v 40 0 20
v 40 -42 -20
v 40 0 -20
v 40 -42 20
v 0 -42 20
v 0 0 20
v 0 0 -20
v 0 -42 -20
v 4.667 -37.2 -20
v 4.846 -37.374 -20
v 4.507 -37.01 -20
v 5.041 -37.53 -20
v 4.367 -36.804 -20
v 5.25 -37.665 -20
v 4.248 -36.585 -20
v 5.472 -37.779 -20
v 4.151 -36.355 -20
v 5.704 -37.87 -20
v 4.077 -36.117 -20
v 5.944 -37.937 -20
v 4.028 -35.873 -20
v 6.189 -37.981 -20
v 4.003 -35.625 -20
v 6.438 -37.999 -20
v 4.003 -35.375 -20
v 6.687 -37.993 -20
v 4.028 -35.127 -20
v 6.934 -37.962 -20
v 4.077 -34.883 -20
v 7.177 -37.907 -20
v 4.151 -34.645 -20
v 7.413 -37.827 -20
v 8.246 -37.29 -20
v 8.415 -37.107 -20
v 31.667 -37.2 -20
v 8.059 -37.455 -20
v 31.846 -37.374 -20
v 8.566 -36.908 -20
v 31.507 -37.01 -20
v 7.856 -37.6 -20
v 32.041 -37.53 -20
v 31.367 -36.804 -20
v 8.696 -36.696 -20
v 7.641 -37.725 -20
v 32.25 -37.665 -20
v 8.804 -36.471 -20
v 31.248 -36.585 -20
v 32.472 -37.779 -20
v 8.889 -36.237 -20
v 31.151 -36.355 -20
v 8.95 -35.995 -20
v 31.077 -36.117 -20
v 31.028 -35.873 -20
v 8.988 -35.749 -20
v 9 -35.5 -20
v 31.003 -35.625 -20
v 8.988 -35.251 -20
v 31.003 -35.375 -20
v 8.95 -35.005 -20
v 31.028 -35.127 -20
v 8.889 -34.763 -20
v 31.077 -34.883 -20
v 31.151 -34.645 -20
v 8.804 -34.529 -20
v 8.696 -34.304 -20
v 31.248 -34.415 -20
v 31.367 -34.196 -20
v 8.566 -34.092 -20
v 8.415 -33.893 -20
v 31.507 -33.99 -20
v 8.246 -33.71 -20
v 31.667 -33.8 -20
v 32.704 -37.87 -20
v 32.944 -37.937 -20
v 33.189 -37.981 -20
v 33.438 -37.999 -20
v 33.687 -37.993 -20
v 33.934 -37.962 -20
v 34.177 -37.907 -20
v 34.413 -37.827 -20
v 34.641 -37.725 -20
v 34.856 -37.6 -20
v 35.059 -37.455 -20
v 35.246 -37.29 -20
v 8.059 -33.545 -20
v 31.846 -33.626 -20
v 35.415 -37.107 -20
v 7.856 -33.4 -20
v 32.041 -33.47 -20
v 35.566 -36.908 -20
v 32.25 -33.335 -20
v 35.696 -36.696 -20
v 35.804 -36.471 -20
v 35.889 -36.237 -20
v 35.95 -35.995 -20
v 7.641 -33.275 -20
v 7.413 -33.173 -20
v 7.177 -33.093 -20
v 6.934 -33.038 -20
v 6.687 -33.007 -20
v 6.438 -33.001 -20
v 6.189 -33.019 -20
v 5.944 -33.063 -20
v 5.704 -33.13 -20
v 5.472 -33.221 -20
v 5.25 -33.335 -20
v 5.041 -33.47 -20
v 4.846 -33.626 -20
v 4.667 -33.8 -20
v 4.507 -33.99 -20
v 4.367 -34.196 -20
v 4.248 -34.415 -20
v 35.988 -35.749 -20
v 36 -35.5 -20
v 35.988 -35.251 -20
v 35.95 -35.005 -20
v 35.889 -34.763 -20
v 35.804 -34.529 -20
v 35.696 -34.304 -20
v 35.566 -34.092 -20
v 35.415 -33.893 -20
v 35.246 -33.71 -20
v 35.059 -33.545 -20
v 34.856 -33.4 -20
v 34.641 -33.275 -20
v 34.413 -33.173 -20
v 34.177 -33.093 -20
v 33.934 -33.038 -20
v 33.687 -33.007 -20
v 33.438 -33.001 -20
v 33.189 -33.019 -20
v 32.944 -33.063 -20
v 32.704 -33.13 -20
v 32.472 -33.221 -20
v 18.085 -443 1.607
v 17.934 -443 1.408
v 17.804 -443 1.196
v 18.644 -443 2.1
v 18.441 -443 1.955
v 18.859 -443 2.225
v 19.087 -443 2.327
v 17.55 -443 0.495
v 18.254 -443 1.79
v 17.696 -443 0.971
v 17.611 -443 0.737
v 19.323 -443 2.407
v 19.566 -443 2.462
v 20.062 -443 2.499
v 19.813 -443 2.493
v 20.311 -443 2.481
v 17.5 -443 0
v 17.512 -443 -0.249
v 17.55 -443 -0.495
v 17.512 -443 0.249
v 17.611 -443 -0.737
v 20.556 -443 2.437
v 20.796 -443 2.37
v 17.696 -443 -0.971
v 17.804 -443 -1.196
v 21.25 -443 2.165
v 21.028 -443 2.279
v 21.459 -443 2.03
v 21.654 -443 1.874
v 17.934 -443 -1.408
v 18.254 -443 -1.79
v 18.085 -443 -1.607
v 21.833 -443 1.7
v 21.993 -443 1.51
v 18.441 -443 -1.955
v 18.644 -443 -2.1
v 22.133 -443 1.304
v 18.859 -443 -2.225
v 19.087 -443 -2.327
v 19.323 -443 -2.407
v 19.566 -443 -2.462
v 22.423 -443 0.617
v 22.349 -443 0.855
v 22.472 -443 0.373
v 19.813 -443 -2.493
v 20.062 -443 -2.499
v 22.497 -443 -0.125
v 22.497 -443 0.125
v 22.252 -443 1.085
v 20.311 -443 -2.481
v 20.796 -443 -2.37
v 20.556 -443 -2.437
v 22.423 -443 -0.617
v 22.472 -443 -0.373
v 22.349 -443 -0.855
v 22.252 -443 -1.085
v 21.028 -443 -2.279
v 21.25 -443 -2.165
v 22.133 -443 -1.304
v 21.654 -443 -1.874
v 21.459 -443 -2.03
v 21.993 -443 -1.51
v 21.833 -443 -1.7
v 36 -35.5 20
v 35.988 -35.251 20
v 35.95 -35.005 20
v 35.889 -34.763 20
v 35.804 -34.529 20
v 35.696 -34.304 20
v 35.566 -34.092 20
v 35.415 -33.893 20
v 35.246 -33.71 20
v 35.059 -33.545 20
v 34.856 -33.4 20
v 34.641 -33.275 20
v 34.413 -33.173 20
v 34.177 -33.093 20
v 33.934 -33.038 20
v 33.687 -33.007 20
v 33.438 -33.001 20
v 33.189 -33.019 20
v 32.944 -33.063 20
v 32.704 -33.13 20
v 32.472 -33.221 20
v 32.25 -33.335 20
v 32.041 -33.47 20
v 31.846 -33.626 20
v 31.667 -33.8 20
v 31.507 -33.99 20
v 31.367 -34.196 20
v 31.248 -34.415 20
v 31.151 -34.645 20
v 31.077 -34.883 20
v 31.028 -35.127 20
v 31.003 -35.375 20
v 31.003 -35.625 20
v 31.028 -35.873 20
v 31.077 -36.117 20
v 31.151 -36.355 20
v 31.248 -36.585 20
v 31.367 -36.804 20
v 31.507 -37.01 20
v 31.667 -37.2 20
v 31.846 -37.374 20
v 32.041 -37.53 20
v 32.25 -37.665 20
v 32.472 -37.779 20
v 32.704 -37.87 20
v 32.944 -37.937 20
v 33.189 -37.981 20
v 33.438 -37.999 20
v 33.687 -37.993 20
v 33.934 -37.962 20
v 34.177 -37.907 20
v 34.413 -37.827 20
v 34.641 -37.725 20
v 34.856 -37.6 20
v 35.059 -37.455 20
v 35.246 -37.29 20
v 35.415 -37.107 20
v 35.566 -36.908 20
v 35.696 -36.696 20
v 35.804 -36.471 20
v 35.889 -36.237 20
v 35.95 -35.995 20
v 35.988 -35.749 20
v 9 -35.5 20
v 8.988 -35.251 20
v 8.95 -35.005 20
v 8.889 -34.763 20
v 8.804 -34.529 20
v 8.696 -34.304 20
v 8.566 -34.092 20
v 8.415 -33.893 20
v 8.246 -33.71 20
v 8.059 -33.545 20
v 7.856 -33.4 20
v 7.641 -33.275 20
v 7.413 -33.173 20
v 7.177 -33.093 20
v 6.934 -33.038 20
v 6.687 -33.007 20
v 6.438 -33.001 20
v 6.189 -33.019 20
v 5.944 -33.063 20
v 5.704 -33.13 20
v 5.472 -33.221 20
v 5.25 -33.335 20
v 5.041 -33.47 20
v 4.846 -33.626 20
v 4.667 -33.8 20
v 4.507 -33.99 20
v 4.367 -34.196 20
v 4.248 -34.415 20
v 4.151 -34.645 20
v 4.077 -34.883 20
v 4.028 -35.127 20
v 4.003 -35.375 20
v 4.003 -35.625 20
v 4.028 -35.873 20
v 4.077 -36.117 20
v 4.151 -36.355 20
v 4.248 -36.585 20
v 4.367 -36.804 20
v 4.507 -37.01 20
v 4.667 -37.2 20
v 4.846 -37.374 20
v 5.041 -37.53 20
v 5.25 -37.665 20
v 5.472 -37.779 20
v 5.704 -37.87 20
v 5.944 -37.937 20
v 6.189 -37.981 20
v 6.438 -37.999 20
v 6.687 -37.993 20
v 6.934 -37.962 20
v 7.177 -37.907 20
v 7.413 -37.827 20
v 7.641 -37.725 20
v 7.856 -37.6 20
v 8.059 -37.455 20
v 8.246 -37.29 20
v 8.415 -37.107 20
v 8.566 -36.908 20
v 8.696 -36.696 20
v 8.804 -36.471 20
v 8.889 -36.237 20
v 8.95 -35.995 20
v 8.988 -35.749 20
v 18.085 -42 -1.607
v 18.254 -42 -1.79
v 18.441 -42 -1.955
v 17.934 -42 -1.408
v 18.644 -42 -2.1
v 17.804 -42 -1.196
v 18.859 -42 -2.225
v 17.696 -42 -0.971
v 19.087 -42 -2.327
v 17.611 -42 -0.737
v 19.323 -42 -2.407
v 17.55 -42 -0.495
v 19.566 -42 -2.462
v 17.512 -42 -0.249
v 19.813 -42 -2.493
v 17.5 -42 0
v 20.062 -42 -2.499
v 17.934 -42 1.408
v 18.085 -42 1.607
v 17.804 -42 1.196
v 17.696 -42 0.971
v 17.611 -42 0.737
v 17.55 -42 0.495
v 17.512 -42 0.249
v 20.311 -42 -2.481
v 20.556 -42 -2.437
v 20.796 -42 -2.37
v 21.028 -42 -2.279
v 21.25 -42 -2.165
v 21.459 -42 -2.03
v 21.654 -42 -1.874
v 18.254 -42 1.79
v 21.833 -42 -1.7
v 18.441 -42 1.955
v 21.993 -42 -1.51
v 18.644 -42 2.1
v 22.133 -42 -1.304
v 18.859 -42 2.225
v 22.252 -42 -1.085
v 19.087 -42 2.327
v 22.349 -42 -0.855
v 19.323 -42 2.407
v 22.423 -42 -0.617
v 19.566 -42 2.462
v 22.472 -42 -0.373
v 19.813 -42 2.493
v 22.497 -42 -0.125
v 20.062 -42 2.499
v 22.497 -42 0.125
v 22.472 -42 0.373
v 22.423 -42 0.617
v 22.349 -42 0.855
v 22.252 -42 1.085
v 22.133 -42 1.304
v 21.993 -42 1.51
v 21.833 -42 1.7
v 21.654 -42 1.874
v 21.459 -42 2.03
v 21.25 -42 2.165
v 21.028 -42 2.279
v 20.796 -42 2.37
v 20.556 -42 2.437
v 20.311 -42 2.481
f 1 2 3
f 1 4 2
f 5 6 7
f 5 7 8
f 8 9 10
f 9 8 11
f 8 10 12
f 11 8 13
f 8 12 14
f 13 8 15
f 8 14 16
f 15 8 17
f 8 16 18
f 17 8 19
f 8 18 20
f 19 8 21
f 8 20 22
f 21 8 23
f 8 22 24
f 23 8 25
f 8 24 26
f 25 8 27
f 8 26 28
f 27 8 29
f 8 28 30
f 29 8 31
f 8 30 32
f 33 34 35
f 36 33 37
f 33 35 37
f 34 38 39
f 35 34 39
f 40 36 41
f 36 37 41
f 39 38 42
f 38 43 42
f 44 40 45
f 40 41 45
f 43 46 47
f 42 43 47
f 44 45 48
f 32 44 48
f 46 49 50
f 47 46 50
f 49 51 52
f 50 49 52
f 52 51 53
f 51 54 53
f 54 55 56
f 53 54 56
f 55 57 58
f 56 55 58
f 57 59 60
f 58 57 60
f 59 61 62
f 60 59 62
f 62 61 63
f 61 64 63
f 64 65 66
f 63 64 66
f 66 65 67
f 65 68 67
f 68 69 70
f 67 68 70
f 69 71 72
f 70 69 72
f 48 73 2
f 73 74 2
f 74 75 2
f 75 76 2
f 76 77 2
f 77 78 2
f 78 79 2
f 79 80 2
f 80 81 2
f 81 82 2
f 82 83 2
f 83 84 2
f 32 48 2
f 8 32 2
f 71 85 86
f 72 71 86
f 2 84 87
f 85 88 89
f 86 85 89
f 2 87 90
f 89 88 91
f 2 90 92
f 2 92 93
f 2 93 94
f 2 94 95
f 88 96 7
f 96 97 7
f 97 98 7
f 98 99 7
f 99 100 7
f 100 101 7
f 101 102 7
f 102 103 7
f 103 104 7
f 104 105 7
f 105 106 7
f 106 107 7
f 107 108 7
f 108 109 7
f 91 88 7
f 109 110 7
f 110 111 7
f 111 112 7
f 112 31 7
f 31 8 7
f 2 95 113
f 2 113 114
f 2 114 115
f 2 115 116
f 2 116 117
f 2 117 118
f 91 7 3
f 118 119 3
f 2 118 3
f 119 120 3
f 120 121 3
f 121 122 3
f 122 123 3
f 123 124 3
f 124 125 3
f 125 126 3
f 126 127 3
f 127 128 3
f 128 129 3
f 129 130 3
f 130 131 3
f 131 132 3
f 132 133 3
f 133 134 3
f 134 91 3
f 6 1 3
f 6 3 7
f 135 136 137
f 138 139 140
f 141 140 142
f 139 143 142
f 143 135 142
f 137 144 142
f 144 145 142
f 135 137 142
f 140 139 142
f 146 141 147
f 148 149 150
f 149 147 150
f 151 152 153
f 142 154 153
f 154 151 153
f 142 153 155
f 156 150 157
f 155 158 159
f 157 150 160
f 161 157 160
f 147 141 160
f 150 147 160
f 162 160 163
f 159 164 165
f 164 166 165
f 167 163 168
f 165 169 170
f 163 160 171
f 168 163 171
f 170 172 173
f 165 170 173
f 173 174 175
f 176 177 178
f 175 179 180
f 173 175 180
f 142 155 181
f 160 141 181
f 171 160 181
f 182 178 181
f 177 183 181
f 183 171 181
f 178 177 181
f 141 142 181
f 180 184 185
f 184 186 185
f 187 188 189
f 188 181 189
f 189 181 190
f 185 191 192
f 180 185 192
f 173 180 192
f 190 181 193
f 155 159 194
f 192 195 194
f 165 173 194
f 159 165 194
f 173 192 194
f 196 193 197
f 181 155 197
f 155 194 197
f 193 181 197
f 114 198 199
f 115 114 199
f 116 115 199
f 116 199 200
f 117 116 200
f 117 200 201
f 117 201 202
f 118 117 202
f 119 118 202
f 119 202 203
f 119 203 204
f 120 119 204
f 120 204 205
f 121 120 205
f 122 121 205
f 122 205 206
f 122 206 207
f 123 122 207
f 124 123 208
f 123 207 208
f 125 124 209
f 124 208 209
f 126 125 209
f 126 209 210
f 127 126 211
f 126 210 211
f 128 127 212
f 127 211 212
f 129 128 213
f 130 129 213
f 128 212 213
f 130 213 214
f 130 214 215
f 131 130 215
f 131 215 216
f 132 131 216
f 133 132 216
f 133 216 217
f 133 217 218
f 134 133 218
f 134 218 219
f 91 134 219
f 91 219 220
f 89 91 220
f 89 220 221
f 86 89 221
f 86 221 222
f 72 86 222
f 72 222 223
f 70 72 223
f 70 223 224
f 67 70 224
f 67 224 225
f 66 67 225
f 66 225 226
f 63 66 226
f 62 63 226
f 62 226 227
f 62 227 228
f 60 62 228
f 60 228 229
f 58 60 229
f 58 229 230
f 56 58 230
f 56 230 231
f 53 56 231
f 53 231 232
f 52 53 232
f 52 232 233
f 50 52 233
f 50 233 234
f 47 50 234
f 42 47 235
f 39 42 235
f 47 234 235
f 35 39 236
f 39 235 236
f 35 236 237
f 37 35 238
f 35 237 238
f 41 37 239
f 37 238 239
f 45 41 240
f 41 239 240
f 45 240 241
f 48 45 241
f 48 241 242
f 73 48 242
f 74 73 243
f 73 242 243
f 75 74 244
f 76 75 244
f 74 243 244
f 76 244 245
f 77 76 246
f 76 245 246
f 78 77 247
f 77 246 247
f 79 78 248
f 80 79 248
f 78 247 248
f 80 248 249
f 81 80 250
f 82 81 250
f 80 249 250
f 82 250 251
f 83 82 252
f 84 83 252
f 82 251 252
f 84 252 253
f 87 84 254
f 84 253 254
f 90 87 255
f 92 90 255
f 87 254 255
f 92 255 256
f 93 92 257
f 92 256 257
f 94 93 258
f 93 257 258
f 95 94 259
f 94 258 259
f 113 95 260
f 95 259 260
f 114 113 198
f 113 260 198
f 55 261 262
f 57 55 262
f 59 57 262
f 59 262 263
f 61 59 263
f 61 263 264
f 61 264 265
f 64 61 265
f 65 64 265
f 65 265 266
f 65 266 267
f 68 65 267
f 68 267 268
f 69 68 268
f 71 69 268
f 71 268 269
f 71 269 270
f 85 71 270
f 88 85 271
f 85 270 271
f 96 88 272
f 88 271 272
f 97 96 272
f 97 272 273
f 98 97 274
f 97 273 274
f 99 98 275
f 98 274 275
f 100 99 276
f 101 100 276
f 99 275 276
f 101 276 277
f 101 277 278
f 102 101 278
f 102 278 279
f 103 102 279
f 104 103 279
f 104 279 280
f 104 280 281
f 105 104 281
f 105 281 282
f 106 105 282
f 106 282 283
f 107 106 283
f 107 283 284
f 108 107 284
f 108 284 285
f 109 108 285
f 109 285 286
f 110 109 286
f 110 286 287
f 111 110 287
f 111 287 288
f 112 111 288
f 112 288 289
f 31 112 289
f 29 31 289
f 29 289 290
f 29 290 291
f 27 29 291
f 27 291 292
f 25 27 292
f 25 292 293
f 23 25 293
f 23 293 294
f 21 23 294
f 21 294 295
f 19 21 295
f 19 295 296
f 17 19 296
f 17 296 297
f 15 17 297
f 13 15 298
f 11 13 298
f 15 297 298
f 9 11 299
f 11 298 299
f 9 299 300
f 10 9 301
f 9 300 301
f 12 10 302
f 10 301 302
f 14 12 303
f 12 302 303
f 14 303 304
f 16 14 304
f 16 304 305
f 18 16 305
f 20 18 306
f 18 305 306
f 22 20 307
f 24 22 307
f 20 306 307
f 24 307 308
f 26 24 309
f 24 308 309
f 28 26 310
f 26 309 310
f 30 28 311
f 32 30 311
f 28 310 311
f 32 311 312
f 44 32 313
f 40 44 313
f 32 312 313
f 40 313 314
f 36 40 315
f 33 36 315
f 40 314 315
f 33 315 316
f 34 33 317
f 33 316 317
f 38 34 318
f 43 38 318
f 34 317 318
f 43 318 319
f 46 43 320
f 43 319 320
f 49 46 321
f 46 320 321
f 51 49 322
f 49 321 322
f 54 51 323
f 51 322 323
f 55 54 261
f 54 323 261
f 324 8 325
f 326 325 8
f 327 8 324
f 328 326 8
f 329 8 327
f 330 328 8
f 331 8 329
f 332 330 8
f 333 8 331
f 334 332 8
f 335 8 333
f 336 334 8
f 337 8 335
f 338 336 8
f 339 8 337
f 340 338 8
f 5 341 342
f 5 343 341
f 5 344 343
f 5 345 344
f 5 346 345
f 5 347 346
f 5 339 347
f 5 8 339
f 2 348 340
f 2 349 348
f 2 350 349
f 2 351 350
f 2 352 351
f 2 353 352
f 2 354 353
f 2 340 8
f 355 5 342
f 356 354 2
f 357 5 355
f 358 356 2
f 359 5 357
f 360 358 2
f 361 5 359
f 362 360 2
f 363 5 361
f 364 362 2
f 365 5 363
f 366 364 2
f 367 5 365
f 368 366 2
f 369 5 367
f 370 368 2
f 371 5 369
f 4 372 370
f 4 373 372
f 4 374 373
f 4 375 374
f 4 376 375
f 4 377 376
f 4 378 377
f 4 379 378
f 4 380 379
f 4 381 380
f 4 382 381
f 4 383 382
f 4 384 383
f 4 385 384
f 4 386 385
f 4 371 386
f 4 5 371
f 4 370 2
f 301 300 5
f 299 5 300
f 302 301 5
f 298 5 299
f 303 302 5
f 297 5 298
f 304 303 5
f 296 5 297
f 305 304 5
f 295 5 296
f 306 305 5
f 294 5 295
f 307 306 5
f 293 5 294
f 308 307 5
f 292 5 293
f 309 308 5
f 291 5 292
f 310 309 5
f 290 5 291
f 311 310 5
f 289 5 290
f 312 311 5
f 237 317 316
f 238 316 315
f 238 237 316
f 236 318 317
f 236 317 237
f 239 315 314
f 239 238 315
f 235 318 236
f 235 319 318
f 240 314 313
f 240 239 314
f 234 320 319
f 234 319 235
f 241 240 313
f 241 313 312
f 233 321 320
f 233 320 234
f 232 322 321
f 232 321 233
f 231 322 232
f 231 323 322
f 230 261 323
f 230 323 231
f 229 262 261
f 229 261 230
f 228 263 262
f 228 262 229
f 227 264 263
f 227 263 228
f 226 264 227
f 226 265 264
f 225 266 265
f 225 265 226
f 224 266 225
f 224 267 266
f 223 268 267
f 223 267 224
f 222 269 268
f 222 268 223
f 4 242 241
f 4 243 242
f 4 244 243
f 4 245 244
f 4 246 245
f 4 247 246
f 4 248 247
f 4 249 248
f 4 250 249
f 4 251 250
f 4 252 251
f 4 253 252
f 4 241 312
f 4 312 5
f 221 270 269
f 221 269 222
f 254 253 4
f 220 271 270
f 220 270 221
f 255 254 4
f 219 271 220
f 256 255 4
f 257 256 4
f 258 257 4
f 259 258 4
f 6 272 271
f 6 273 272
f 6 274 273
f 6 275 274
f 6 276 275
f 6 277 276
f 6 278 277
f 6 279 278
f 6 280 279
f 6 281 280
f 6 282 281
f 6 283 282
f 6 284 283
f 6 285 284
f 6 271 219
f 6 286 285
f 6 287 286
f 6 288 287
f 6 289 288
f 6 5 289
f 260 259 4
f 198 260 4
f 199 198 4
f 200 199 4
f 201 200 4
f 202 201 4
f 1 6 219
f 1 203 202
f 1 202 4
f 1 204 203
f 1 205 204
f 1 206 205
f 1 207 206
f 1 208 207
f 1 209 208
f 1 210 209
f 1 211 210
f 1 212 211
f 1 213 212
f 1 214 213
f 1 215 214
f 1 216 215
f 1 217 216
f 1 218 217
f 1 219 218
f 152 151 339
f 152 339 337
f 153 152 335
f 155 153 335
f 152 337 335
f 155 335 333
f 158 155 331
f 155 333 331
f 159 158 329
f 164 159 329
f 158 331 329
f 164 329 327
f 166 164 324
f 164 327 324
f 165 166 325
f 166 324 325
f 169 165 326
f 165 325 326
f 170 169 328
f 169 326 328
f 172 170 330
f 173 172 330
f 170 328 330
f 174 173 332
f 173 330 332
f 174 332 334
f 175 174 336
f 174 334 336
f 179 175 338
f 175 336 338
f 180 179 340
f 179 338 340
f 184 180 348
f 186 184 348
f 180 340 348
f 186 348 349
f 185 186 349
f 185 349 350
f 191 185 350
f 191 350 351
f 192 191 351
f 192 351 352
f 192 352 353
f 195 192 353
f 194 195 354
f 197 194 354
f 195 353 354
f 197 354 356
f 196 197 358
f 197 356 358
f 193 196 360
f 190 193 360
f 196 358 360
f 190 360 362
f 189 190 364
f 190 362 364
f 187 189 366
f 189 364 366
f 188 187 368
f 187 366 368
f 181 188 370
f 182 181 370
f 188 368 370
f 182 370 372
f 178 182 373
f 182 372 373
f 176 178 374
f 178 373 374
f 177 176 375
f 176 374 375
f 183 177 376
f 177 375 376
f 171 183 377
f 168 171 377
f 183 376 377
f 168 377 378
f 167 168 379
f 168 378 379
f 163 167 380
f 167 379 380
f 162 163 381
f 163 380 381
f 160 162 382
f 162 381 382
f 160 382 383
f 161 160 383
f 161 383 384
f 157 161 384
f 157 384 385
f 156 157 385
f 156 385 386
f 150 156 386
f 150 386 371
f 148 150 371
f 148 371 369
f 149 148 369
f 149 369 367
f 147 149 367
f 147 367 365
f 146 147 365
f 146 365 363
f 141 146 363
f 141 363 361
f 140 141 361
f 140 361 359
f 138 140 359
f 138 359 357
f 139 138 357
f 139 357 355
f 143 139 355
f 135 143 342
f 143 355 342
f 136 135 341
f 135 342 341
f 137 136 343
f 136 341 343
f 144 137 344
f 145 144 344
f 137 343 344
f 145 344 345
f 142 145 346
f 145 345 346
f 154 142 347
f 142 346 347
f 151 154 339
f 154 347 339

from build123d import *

# Parameters (mm, degrees)
EXTRUDE_1_DEPTH     = 20
SKETCH_1_3_W        = 2.5
SKETCH_1_3_H        = 401
SKETCH_2_R          = 2.5
CUT_EXTRUDE_1_DEPTH = 447.597133891


with BuildPart() as part:
    # 草图1 → 凸台-拉伸1 (new, symmetric)
    with BuildSketch(Plane.XY):
        Polygon((40, 0), (0, 0), (0, -42), (17.5, -42), (20, -42), (22.5, -42), (40, -42), align=None)
    extrude(amount=EXTRUDE_1_DEPTH, both=True)

    # 草图1<3> → 旋转1 (revolve)
    with BuildSketch(Plane.XY):
        with Locations((21.25, -242.5)):
            Rectangle(SKETCH_1_3_W, SKETCH_1_3_H)
    revolve(axis=Axis((20, -42, 0), (0, -1, 0)))

    # 草图2 → 切除-拉伸1 (cut, through all)
    with BuildSketch(Plane.XY.offset(20)):
        with Locations((6.5, -35.5)):
            Circle(SKETCH_2_R)
        with Locations((33.5, -35.5)):
            Circle(SKETCH_2_R)
    extrude(amount=-CUT_EXTRUDE_1_DEPTH, mode=Mode.SUBTRACT)


solid = part.part
